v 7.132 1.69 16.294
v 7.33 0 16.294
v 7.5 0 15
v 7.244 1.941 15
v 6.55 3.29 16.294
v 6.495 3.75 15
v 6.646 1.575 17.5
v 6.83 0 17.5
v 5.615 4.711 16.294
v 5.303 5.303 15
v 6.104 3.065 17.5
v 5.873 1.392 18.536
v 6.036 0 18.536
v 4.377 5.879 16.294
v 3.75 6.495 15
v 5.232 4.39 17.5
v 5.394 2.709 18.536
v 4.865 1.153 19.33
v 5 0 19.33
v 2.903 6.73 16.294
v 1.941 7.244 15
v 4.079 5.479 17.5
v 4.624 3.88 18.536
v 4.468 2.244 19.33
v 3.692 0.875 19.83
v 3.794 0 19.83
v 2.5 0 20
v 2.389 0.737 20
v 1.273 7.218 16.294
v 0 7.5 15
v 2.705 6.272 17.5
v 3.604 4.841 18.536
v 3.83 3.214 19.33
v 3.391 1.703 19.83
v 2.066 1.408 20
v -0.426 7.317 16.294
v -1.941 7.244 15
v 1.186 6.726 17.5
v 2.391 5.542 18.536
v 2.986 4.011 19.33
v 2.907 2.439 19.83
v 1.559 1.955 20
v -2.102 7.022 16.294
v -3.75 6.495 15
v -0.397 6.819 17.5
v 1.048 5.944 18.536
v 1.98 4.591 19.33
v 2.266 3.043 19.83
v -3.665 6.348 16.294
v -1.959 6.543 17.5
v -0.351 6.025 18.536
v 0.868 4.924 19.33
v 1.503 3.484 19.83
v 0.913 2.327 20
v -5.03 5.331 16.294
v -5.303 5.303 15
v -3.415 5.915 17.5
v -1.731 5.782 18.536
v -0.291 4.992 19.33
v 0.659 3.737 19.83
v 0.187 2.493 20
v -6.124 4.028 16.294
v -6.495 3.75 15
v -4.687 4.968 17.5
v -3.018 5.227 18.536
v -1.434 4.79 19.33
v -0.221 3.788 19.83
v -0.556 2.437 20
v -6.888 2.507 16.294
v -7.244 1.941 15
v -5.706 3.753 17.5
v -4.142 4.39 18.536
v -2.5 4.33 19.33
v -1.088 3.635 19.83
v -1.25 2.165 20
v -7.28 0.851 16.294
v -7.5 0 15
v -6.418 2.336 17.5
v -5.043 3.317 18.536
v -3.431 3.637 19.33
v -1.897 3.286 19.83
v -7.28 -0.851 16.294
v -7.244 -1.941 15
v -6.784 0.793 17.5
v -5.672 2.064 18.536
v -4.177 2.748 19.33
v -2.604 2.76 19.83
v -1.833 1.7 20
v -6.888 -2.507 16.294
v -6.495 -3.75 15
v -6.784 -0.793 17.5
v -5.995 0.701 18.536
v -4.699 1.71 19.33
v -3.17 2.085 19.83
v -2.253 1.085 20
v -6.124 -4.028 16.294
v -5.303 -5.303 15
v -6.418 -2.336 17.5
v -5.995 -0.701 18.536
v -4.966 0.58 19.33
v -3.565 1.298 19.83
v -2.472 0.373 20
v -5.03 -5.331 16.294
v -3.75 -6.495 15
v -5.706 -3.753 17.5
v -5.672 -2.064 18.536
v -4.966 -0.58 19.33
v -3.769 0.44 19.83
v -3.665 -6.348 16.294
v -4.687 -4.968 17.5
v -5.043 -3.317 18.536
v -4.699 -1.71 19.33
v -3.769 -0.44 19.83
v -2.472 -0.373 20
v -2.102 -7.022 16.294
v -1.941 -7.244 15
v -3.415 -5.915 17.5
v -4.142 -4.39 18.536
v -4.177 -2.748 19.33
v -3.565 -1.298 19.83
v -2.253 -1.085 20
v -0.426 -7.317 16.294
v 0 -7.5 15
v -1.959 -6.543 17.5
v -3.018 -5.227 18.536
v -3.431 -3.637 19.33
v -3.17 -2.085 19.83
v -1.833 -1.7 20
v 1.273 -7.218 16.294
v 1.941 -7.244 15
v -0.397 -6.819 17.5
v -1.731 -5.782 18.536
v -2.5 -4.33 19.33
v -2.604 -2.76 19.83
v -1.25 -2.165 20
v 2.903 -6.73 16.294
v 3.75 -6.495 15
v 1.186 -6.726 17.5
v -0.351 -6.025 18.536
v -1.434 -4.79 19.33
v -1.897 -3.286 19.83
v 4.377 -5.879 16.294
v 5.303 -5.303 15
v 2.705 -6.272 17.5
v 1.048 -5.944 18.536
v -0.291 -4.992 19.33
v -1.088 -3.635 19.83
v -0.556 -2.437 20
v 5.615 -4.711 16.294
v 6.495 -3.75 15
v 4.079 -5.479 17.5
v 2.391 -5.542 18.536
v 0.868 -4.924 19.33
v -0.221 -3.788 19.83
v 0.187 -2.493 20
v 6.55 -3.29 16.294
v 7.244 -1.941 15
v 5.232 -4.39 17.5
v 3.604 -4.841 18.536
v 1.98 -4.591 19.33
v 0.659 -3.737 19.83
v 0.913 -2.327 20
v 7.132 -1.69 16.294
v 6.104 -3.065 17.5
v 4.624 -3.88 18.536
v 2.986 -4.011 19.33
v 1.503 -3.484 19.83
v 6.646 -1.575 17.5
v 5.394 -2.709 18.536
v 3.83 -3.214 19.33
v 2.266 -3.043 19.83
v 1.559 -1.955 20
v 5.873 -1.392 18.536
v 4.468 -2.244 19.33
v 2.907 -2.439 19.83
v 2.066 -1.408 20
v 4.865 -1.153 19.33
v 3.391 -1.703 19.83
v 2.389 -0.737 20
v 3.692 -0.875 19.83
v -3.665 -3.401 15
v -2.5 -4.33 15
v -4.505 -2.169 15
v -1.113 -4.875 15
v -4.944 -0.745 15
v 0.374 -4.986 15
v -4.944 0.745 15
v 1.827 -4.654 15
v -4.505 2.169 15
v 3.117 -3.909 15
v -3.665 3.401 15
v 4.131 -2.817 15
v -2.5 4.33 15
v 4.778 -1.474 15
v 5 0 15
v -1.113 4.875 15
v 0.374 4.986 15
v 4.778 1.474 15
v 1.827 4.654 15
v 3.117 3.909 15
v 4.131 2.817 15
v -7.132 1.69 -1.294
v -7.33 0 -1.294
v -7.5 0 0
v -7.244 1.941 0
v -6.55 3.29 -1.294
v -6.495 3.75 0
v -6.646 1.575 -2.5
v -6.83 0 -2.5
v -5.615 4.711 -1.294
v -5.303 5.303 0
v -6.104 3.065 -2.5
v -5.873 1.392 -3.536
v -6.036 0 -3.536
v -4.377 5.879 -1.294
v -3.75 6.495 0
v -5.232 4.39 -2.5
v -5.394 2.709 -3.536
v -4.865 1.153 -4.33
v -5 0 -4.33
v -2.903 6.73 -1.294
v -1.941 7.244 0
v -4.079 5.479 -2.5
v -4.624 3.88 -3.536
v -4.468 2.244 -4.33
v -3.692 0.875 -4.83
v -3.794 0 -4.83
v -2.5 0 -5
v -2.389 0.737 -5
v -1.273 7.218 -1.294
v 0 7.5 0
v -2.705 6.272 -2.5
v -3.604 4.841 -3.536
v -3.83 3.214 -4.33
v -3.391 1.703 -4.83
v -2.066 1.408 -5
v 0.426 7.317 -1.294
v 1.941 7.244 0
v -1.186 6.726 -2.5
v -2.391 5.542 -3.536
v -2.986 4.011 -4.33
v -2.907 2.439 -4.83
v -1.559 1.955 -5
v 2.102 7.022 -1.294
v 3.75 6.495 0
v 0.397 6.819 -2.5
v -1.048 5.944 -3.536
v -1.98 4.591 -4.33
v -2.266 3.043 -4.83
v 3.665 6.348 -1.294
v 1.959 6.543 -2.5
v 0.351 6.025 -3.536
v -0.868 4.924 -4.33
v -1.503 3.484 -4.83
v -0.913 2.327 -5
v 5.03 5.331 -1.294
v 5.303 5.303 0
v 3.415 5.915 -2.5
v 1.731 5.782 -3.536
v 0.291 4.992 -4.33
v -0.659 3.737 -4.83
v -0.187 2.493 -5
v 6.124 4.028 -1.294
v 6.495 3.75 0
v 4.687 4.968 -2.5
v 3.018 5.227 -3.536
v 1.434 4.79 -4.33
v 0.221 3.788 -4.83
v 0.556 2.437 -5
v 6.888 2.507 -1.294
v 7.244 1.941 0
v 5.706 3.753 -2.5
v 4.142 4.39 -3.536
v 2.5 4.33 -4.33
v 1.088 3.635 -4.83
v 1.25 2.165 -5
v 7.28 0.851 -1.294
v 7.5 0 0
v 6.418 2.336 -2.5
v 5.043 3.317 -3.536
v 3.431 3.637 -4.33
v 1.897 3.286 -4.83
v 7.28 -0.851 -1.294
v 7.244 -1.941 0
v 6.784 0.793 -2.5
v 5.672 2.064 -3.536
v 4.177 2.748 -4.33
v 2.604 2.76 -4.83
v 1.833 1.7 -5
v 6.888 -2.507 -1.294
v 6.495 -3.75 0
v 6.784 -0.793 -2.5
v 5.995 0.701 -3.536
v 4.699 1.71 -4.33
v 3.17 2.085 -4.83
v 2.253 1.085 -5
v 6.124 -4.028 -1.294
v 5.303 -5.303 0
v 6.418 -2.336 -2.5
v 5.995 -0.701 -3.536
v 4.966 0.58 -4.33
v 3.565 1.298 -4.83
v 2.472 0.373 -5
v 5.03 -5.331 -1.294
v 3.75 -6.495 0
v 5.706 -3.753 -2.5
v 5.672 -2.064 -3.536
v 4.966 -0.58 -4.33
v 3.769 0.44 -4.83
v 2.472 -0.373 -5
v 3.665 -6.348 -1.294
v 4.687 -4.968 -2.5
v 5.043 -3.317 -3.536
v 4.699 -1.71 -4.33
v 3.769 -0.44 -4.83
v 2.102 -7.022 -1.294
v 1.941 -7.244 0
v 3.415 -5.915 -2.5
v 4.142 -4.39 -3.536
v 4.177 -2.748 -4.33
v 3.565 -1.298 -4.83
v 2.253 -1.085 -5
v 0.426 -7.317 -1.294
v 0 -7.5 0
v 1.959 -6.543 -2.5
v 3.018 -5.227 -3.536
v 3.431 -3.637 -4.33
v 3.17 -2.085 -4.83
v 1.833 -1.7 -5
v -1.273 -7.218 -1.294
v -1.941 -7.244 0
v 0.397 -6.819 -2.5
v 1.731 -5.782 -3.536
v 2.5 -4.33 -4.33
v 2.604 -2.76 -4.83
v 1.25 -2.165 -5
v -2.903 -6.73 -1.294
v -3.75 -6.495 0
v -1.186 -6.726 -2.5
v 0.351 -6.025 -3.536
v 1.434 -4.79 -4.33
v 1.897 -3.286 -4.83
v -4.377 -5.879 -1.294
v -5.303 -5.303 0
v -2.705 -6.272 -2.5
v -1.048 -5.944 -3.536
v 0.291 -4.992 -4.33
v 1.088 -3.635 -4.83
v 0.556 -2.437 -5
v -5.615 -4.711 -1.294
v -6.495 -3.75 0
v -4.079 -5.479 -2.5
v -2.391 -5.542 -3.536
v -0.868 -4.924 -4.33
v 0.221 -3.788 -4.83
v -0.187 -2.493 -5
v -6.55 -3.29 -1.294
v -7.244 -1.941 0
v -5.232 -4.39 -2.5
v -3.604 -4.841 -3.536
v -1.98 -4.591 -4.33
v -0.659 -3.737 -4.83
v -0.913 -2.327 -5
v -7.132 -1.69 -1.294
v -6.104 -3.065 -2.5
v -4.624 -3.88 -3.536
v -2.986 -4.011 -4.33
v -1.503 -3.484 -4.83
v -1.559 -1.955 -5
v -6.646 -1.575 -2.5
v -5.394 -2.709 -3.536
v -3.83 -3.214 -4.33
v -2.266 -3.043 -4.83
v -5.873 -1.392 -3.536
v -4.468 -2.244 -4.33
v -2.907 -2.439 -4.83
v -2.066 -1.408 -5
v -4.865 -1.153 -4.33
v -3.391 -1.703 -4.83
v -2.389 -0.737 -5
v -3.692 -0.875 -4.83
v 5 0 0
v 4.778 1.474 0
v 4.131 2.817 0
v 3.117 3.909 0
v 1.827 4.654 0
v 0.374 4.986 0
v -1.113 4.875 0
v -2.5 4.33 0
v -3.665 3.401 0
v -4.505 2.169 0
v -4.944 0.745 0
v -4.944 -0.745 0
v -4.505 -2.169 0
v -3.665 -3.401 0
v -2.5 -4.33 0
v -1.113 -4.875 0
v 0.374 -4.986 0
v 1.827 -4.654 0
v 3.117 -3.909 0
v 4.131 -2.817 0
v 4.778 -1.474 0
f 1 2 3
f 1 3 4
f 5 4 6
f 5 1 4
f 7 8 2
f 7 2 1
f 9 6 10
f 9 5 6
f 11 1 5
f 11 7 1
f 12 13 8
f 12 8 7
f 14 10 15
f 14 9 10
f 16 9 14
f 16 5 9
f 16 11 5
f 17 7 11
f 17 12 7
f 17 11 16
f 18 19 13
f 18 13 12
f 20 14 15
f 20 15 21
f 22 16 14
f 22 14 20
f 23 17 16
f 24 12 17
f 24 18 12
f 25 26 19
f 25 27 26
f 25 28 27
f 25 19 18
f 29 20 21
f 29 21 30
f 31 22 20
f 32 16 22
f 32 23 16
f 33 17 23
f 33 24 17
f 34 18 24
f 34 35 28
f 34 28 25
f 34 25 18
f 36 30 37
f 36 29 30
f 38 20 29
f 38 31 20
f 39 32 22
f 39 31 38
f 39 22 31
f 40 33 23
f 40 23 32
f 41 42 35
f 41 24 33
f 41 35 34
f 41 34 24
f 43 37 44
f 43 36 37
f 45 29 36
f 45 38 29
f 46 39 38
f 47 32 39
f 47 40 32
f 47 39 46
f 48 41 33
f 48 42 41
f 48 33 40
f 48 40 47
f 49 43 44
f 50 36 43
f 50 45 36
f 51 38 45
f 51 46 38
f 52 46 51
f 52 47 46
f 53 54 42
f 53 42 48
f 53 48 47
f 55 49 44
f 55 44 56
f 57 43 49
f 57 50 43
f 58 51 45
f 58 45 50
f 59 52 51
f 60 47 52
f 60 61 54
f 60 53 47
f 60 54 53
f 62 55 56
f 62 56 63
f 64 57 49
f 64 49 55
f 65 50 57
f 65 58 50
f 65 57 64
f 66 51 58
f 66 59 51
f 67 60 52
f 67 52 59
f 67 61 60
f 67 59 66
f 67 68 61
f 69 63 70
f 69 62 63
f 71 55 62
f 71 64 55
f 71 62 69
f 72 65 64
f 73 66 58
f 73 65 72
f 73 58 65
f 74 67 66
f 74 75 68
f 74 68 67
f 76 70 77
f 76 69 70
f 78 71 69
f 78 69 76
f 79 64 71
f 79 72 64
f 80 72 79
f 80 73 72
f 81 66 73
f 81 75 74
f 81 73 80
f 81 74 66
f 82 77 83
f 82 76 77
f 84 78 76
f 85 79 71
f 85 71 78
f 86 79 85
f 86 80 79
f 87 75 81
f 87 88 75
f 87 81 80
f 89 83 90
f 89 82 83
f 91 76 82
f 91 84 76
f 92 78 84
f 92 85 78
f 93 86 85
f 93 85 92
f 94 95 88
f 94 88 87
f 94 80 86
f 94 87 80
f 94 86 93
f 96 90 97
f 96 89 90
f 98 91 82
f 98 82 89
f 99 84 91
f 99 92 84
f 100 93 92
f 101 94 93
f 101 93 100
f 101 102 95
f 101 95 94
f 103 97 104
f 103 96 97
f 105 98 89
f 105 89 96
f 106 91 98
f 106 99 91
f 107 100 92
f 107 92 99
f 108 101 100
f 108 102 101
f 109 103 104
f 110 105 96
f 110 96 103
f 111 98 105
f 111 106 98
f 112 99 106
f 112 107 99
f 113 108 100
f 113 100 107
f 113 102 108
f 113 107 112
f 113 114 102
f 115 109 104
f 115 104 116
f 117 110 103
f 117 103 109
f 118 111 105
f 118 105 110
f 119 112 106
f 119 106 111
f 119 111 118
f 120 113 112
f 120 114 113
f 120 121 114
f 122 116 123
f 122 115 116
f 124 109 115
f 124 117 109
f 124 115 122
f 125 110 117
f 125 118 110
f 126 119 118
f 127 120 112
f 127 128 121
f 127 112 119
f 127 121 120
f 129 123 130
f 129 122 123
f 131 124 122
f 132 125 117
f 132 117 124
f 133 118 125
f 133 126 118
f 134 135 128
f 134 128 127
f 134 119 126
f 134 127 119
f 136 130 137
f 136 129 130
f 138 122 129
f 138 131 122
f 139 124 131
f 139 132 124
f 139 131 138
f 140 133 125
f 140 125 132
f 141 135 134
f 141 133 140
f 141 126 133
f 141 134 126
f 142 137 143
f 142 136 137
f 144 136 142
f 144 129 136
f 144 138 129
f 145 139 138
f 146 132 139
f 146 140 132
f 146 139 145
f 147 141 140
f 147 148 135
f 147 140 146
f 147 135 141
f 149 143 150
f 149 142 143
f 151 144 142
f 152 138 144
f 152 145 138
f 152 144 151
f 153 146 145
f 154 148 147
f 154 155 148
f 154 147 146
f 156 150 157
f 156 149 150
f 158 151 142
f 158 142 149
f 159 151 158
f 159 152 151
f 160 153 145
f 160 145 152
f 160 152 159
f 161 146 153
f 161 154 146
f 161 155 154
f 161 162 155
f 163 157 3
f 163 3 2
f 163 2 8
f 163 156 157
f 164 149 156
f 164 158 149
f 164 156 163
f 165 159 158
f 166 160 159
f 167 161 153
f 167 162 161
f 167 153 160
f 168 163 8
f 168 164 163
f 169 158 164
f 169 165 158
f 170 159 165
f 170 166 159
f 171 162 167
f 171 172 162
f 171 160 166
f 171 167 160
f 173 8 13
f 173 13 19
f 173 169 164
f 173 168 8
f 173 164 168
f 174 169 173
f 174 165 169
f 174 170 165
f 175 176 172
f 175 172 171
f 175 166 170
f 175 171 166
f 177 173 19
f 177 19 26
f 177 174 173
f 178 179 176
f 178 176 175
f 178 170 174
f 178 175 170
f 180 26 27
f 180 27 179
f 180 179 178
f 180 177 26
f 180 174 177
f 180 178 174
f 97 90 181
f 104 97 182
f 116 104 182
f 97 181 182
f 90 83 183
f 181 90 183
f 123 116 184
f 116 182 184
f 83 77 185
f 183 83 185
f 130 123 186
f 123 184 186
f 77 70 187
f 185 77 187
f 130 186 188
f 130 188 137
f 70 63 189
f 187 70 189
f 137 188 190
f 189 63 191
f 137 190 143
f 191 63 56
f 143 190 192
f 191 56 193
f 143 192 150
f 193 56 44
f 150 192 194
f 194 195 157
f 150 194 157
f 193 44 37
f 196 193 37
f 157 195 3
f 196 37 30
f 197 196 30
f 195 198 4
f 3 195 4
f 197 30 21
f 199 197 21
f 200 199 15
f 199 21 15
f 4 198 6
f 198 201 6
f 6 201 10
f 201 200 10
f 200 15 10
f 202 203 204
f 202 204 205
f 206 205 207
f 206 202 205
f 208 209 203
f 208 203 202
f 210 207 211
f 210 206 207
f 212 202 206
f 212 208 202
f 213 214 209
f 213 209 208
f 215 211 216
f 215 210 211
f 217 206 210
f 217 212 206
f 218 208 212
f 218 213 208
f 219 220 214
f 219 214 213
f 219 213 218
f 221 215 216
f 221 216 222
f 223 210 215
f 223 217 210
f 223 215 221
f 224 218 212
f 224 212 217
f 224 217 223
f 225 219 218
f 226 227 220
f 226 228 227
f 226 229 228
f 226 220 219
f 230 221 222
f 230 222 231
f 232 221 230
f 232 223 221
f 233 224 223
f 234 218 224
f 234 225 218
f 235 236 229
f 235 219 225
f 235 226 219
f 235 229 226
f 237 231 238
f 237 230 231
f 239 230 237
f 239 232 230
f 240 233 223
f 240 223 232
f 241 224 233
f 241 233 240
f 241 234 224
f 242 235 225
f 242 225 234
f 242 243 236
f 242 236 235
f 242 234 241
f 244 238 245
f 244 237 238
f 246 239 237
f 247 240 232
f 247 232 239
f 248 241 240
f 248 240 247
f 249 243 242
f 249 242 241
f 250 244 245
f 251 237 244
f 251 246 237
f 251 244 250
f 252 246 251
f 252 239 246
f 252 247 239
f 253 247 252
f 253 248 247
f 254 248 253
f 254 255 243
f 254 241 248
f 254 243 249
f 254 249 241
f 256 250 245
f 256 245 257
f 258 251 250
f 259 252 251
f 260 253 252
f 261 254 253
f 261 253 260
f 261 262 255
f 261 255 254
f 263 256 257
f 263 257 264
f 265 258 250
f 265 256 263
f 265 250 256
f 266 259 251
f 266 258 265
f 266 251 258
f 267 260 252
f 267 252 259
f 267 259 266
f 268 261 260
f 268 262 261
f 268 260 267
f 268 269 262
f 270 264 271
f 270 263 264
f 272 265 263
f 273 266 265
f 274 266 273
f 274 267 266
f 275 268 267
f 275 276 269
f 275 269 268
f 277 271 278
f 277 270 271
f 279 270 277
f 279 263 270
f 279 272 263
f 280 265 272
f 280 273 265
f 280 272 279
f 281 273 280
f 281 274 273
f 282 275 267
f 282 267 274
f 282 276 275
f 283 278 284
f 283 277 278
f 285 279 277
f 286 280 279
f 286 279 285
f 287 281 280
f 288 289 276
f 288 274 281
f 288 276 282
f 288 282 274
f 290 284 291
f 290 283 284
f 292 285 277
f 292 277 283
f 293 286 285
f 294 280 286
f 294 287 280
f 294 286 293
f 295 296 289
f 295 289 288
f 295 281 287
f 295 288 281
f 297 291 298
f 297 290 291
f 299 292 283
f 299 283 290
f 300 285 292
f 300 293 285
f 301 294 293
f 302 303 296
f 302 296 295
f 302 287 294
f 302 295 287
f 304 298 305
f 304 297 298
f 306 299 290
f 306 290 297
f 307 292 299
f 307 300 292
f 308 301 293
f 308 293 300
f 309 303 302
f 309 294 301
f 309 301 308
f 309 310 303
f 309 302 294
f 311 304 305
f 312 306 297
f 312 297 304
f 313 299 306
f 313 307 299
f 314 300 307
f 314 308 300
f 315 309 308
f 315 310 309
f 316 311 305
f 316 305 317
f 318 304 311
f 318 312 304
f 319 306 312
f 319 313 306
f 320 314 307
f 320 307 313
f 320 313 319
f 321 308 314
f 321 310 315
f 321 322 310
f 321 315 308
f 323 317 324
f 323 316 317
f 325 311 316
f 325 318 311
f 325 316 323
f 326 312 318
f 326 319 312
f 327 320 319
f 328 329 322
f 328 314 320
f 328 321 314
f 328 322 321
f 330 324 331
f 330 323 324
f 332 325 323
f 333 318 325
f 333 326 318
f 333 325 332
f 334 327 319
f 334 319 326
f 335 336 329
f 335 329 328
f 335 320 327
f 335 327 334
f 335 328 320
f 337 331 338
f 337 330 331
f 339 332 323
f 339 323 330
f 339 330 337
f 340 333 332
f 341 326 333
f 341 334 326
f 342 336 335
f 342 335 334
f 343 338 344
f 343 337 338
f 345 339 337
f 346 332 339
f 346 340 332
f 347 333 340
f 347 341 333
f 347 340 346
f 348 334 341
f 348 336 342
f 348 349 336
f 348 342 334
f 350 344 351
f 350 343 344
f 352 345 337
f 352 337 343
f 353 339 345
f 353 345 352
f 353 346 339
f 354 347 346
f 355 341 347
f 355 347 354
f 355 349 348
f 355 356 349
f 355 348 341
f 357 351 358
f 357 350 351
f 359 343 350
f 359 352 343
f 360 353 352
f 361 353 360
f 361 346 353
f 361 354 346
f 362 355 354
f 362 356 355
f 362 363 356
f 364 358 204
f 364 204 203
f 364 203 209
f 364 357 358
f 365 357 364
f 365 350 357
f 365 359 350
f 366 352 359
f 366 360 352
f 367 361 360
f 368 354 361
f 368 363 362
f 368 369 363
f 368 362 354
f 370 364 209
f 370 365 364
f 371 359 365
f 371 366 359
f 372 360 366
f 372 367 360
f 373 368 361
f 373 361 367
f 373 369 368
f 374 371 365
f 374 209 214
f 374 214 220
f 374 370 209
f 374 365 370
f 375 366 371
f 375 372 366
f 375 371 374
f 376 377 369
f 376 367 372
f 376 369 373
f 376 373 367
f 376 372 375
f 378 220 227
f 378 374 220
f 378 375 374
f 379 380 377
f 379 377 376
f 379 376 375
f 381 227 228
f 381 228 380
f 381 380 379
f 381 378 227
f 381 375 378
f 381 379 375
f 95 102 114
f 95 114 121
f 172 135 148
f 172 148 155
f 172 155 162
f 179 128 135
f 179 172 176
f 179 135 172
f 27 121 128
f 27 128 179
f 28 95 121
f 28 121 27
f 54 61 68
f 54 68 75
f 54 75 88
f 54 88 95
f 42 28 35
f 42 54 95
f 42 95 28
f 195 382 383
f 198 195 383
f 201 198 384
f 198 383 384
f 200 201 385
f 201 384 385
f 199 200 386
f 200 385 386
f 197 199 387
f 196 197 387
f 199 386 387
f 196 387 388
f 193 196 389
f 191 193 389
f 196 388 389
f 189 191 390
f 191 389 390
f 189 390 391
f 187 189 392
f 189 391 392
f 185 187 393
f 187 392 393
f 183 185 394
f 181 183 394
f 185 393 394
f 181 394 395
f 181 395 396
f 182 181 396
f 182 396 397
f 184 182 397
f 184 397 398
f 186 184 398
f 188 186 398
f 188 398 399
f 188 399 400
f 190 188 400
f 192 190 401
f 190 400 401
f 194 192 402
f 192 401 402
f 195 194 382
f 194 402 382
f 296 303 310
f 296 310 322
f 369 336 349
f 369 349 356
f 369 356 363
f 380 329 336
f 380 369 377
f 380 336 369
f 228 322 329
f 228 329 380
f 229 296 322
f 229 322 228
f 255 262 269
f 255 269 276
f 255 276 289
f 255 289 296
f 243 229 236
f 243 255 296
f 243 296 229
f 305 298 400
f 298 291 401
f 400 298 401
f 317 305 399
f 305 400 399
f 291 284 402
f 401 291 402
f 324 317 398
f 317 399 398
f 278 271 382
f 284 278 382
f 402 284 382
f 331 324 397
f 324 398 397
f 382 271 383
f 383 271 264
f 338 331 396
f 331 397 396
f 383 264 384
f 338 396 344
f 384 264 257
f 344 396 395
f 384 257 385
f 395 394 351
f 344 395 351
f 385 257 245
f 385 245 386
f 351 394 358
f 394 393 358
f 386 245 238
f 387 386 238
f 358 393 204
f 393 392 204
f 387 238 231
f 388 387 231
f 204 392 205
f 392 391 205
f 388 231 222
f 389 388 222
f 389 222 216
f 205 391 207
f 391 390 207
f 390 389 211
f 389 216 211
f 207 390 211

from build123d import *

# Parameters (mm, degrees)
IZIM1_R                     = 5
Y_KSEKLIK_EKSTR_ZYON1_DEPTH = 15
IZIM2_R                     = 7.5
Y_KSEKLIK_EKSTR_ZYON2_DEPTH = 5
RADYUS1_R                   = 5
Y_KSEKLIK_EKSTR_ZYON3_START = 5
IZIM3_R                     = 7.5
Y_KSEKLIK_EKSTR_ZYON3_DEPTH = 5
RADYUS2_R                   = 5


with BuildPart() as part:
    # Çizim1 → Yükseklik-Ekstrüzyon1 (new body)
    with BuildSketch(Plane.XY):
        Circle(IZIM1_R)
    extrude(amount=Y_KSEKLIK_EKSTR_ZYON1_DEPTH)

    # Çizim2 → Yükseklik-Ekstrüzyon2 (add)
    with BuildSketch(Plane.XY.offset(15)):
        Circle(IZIM2_R)
    extrude(amount=Y_KSEKLIK_EKSTR_ZYON2_DEPTH)

    # Radyus1
    radyus1_edges = [part.edges().sort_by_distance(p)[0] for p in [
        (-7.5, 0, 20),
    ]]
    fillet(radyus1_edges, radius=RADYUS1_R - 0.0001)  # a hair under: the kernel refuses the full size

    # Çizim3 → Yükseklik-Ekstrüzyon3 (add)
    with BuildSketch(Plane(origin=(0, 0, 0), x_dir=(-1, 0, 0), z_dir=(0, 0, -1)).offset(Y_KSEKLIK_EKSTR_ZYON3_START)):
        Circle(IZIM3_R)
    extrude(amount=-Y_KSEKLIK_EKSTR_ZYON3_DEPTH)

    # Radyus2
    radyus2_edges = [part.edges().sort_by_distance(p)[0] for p in [
        (7.5, 0, -5),
    ]]
    fillet(radyus2_edges, radius=RADYUS2_R - 0.0001)  # a hair under: the kernel refuses the full size


solid = part.part
